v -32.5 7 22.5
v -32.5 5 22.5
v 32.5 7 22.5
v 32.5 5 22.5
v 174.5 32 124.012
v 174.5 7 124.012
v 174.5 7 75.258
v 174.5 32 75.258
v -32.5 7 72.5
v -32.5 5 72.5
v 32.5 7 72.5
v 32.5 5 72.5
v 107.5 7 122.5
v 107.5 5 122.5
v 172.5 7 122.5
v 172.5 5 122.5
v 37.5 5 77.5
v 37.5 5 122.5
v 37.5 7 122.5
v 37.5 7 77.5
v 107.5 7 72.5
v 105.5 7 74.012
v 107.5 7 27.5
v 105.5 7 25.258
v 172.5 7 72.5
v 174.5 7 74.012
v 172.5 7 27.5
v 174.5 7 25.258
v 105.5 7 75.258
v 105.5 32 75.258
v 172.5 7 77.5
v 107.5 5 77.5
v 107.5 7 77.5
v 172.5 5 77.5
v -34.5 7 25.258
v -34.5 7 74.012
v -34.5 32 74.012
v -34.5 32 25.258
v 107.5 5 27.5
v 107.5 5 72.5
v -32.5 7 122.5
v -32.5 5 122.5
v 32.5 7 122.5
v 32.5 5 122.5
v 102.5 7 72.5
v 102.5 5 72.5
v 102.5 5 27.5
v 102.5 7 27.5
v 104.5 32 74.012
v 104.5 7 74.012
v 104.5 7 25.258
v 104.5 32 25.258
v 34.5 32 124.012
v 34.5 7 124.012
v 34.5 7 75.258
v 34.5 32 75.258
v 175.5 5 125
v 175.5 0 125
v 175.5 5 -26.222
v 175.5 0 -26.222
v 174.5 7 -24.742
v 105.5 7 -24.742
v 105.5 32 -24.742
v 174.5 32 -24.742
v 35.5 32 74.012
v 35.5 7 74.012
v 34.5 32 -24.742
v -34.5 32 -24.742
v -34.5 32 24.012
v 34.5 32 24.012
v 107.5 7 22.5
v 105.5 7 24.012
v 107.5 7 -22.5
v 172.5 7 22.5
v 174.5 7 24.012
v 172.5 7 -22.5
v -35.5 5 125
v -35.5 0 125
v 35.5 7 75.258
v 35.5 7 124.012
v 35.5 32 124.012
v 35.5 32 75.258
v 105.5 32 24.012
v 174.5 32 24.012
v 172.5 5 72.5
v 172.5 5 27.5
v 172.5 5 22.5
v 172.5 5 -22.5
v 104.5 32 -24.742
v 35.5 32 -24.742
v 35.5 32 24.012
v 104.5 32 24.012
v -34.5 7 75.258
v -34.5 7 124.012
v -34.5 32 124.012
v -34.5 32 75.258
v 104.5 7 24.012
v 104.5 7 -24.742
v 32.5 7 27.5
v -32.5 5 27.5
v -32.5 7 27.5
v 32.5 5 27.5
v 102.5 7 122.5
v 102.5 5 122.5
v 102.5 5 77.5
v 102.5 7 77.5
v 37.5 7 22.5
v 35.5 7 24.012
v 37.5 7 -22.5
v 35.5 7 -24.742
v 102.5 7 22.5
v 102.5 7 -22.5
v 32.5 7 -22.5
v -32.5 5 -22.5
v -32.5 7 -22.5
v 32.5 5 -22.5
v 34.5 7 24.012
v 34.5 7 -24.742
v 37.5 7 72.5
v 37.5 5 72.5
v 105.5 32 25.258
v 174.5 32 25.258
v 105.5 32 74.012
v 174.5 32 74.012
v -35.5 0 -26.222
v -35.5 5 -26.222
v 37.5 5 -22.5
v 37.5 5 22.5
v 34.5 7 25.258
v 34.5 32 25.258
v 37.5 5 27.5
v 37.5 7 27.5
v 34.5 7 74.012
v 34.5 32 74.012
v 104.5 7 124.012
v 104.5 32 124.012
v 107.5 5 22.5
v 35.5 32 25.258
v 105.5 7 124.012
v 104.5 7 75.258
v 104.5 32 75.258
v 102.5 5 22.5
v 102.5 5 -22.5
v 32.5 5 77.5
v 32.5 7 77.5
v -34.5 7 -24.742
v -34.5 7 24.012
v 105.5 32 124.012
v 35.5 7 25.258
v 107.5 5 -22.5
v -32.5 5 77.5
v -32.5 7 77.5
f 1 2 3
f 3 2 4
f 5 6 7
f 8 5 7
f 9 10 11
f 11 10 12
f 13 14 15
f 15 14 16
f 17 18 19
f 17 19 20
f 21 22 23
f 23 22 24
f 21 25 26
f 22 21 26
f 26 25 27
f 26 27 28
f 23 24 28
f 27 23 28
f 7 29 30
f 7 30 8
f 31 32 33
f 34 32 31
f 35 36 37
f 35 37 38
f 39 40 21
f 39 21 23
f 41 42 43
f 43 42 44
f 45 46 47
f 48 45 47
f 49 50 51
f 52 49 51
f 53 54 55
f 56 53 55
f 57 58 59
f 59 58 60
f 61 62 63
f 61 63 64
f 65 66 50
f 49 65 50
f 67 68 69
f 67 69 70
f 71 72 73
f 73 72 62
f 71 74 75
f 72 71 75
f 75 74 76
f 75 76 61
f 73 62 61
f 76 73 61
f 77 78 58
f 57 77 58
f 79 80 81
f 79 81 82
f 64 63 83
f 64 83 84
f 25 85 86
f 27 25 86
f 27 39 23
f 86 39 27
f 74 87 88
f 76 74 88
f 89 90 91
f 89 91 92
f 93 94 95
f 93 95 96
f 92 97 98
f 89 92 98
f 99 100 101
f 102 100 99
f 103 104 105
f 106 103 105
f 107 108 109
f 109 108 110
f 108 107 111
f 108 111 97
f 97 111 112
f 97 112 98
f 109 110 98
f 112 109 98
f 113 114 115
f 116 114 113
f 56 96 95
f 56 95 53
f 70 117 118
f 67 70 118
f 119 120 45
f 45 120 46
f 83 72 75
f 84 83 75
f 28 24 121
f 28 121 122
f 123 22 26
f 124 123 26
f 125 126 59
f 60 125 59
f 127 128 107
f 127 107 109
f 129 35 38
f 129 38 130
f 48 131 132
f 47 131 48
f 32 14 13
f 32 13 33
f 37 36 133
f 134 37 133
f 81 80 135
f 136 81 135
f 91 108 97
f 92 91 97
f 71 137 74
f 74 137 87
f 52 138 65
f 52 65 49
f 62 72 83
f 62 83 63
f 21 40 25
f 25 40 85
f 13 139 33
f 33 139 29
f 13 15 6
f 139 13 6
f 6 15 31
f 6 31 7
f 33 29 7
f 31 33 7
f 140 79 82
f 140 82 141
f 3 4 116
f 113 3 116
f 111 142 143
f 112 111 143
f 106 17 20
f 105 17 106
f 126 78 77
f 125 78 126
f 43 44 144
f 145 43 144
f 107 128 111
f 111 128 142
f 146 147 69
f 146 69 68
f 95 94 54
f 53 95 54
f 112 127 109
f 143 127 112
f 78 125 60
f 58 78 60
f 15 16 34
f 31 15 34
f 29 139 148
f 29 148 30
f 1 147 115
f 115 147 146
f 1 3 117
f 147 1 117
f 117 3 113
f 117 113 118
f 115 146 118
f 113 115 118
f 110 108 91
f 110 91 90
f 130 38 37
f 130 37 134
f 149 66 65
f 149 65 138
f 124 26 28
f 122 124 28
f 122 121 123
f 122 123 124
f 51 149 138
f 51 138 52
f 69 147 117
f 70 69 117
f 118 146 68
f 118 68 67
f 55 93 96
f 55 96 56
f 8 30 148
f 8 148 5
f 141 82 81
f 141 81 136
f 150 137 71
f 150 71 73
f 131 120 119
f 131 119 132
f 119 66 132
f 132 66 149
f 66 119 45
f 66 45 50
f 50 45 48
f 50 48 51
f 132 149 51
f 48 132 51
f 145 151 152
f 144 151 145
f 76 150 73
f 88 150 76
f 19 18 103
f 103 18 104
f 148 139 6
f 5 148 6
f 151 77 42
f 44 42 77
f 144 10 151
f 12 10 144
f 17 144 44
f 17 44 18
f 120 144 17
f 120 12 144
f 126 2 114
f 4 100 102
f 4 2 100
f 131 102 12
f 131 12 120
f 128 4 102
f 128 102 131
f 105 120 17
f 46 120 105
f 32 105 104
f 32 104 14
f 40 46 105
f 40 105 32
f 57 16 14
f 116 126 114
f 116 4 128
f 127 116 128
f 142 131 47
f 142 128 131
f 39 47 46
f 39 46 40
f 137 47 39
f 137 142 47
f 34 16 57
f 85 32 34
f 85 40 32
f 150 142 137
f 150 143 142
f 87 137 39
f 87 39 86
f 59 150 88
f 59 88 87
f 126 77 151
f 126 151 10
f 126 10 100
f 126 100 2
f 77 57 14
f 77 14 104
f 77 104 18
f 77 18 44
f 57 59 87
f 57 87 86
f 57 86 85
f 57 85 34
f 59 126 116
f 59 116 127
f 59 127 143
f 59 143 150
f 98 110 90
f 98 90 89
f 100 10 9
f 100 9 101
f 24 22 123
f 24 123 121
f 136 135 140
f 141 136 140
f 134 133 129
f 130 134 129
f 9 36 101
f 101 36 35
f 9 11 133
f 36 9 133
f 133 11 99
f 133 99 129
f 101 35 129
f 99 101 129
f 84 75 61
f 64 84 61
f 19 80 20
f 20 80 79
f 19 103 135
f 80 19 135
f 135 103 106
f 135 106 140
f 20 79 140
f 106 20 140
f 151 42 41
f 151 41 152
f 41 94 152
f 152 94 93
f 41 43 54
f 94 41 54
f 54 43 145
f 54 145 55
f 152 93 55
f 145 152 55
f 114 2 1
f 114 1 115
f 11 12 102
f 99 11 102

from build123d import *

# Parameters (mm, degrees)
SKETCH1_W                 = 71
SKETCH1_H                 = 250
BOSS_EXTRUDE1_DEPTH       = 5
SKETCH2_W                 = 65
SKETCH2_H                 = 45
BOSS_EXTRUDE3_DEPTH       = 2
LPATTERN1_COUNT           = 3
LPATTERN1_PITCH           = 50
SKETCH3_W                 = 69
SKETCH3_H                 = 48.754858224
BOSS_EXTRUDE8_DEPTH       = 25
LPATTERN5_COUNT           = 3
LPATTERN5_PITCH           = 50
LPATTERN6_COUNT           = 3
LPATTERN6_PITCH           = 70
LPATTERN6_COPY_1_SKETCH_W = 65
LPATTERN6_COPY_1_SKETCH_H = 45
LPATTERN6_COPY_1_DEPTH    = 2
LPATTERN6_COPY_2_SKETCH_W = 65
LPATTERN6_COPY_2_SKETCH_H = 45
LPATTERN6_COPY_2_DEPTH    = 2
LPATTERN6_COPY_3_SKETCH_W = 65
LPATTERN6_COPY_3_SKETCH_H = 45
LPATTERN6_COPY_3_DEPTH    = 2
LPATTERN6_COPY_4_SKETCH_W = 65
LPATTERN6_COPY_4_SKETCH_H = 45
LPATTERN6_COPY_4_DEPTH    = 2
LPATTERN6_COPY_5_SKETCH_W = 69
LPATTERN6_COPY_5_SKETCH_H = 48.754858224
LPATTERN6_COPY_5_DEPTH    = 25
LPATTERN6_COPY_6_SKETCH_W = 69
LPATTERN6_COPY_6_SKETCH_H = 48.754858224
LPATTERN6_COPY_6_DEPTH    = 25
LPATTERN6_COPY_7_SKETCH_W = 69
LPATTERN6_COPY_7_SKETCH_H = 48.754858224
LPATTERN6_COPY_7_DEPTH    = 25
LPATTERN6_COPY_8_SKETCH_W = 69
LPATTERN6_COPY_8_SKETCH_H = 48.754858224
LPATTERN6_COPY_8_DEPTH    = 25
SKETCH6_W                 = 211
SKETCH6_H                 = 98.778316014
CUT_EXTRUDE1_DEPTH        = 10


with BuildPart() as part:
    # Sketch1 → Boss-Extrude1 (new body)
    with BuildSketch(Plane(origin=(0, 0, 0), x_dir=(1, 0, 0), z_dir=(0, 1, 0))):
        Rectangle(SKETCH1_W, SKETCH1_H)
    boss_extrude1 = extrude(amount=BOSS_EXTRUDE1_DEPTH)

    # Sketch2 → Boss-Extrude3 (add)
    with BuildSketch(Plane(origin=(0, 5, 0), x_dir=(1, 0, 0), z_dir=(0, 1, 0))):
        with Locations((0, -100)):
            Rectangle(SKETCH2_W, SKETCH2_H)
    boss_extrude3 = extrude(amount=BOSS_EXTRUDE3_DEPTH)

    # LPattern1: Boss-Extrude3 ×3
    with Locations(*[(0, 0, -i * LPATTERN1_PITCH) for i in range(1, LPATTERN1_COUNT)]):
        add(boss_extrude3)

    # Sketch3 → Boss-Extrude8 (add)
    with BuildSketch(Plane(origin=(0, 7, 0), x_dir=(1, 0, 0), z_dir=(0, 1, 0))):
        with Locations((0, -99.635002086)):
            Rectangle(SKETCH3_W, SKETCH3_H)
    boss_extrude8 = extrude(amount=BOSS_EXTRUDE8_DEPTH)

    # LPattern5: Boss-Extrude8 ×3
    with Locations(*[(0, 0, -i * LPATTERN5_PITCH) for i in range(1, LPATTERN5_COUNT)]):
        add(boss_extrude8)

    # LPattern6: Boss-Extrude1, Boss-Extrude3, Boss-Extrude8 ×3
    with Locations(*[(i * LPATTERN6_PITCH, 0, 0) for i in range(1, LPATTERN6_COUNT)]):
        add(boss_extrude1)
        add(boss_extrude3)
        add(boss_extrude8)

    # LPattern6 copy 1 sketch → LPattern6 copy 1 (add)
    with BuildSketch(Plane(origin=(70, 5, -50), x_dir=(1, 0, 0), z_dir=(0, 1, 0))):
        with Locations((0, -100)):
            Rectangle(LPATTERN6_COPY_1_SKETCH_W, LPATTERN6_COPY_1_SKETCH_H)
    extrude(amount=LPATTERN6_COPY_1_DEPTH)

    # LPattern6 copy 2 sketch → LPattern6 copy 2 (add)
    with BuildSketch(Plane(origin=(140, 5, -50), x_dir=(1, 0, 0), z_dir=(0, 1, 0))):
        with Locations((0, -100)):
            Rectangle(LPATTERN6_COPY_2_SKETCH_W, LPATTERN6_COPY_2_SKETCH_H)
    extrude(amount=LPATTERN6_COPY_2_DEPTH)

    # LPattern6 copy 3 sketch → LPattern6 copy 3 (add)
    with BuildSketch(Plane(origin=(70, 5, -100), x_dir=(1, 0, 0), z_dir=(0, 1, 0))):
        with Locations((0, -100)):
            Rectangle(LPATTERN6_COPY_3_SKETCH_W, LPATTERN6_COPY_3_SKETCH_H)
    extrude(amount=LPATTERN6_COPY_3_DEPTH)

    # LPattern6 copy 4 sketch → LPattern6 copy 4 (add)
    with BuildSketch(Plane(origin=(140, 5, -100), x_dir=(1, 0, 0), z_dir=(0, 1, 0))):
        with Locations((0, -100)):
            Rectangle(LPATTERN6_COPY_4_SKETCH_W, LPATTERN6_COPY_4_SKETCH_H)
    extrude(amount=LPATTERN6_COPY_4_DEPTH)

    # LPattern6 copy 5 sketch → LPattern6 copy 5 (add)
    with BuildSketch(Plane(origin=(70, 7, -50), x_dir=(1, 0, 0), z_dir=(0, 1, 0))):
        with Locations((0, -99.635002086)):
            Rectangle(LPATTERN6_COPY_5_SKETCH_W, LPATTERN6_COPY_5_SKETCH_H)
    extrude(amount=LPATTERN6_COPY_5_DEPTH)

    # LPattern6 copy 6 sketch → LPattern6 copy 6 (add)
    with BuildSketch(Plane(origin=(140, 7, -50), x_dir=(1, 0, 0), z_dir=(0, 1, 0))):
        with Locations((0, -99.635002086)):
            Rectangle(LPATTERN6_COPY_6_SKETCH_W, LPATTERN6_COPY_6_SKETCH_H)
    extrude(amount=LPATTERN6_COPY_6_DEPTH)

    # LPattern6 copy 7 sketch → LPattern6 copy 7 (add)
    with BuildSketch(Plane(origin=(70, 7, -100), x_dir=(1, 0, 0), z_dir=(0, 1, 0))):
        with Locations((0, -99.635002086)):
            Rectangle(LPATTERN6_COPY_7_SKETCH_W, LPATTERN6_COPY_7_SKETCH_H)
    extrude(amount=LPATTERN6_COPY_7_DEPTH)

    # LPattern6 copy 8 sketch → LPattern6 copy 8 (add)
    with BuildSketch(Plane(origin=(140, 7, -100), x_dir=(1, 0, 0), z_dir=(0, 1, 0))):
        with Locations((0, -99.635002086)):
            Rectangle(LPATTERN6_COPY_8_SKETCH_W, LPATTERN6_COPY_8_SKETCH_H)
    extrude(amount=LPATTERN6_COPY_8_DEPTH)

    # Sketch6 → Cut-Extrude1 (cut)
    with BuildSketch(Plane(origin=(0, 5, 0), x_dir=(1, 0, 0), z_dir=(0, 1, 0))):
        with Locations((70, 75.610841993)):
            Rectangle(SKETCH6_W, SKETCH6_H)
    extrude(amount=-CUT_EXTRUDE1_DEPTH, mode=Mode.SUBTRACT)


solid = part.part
